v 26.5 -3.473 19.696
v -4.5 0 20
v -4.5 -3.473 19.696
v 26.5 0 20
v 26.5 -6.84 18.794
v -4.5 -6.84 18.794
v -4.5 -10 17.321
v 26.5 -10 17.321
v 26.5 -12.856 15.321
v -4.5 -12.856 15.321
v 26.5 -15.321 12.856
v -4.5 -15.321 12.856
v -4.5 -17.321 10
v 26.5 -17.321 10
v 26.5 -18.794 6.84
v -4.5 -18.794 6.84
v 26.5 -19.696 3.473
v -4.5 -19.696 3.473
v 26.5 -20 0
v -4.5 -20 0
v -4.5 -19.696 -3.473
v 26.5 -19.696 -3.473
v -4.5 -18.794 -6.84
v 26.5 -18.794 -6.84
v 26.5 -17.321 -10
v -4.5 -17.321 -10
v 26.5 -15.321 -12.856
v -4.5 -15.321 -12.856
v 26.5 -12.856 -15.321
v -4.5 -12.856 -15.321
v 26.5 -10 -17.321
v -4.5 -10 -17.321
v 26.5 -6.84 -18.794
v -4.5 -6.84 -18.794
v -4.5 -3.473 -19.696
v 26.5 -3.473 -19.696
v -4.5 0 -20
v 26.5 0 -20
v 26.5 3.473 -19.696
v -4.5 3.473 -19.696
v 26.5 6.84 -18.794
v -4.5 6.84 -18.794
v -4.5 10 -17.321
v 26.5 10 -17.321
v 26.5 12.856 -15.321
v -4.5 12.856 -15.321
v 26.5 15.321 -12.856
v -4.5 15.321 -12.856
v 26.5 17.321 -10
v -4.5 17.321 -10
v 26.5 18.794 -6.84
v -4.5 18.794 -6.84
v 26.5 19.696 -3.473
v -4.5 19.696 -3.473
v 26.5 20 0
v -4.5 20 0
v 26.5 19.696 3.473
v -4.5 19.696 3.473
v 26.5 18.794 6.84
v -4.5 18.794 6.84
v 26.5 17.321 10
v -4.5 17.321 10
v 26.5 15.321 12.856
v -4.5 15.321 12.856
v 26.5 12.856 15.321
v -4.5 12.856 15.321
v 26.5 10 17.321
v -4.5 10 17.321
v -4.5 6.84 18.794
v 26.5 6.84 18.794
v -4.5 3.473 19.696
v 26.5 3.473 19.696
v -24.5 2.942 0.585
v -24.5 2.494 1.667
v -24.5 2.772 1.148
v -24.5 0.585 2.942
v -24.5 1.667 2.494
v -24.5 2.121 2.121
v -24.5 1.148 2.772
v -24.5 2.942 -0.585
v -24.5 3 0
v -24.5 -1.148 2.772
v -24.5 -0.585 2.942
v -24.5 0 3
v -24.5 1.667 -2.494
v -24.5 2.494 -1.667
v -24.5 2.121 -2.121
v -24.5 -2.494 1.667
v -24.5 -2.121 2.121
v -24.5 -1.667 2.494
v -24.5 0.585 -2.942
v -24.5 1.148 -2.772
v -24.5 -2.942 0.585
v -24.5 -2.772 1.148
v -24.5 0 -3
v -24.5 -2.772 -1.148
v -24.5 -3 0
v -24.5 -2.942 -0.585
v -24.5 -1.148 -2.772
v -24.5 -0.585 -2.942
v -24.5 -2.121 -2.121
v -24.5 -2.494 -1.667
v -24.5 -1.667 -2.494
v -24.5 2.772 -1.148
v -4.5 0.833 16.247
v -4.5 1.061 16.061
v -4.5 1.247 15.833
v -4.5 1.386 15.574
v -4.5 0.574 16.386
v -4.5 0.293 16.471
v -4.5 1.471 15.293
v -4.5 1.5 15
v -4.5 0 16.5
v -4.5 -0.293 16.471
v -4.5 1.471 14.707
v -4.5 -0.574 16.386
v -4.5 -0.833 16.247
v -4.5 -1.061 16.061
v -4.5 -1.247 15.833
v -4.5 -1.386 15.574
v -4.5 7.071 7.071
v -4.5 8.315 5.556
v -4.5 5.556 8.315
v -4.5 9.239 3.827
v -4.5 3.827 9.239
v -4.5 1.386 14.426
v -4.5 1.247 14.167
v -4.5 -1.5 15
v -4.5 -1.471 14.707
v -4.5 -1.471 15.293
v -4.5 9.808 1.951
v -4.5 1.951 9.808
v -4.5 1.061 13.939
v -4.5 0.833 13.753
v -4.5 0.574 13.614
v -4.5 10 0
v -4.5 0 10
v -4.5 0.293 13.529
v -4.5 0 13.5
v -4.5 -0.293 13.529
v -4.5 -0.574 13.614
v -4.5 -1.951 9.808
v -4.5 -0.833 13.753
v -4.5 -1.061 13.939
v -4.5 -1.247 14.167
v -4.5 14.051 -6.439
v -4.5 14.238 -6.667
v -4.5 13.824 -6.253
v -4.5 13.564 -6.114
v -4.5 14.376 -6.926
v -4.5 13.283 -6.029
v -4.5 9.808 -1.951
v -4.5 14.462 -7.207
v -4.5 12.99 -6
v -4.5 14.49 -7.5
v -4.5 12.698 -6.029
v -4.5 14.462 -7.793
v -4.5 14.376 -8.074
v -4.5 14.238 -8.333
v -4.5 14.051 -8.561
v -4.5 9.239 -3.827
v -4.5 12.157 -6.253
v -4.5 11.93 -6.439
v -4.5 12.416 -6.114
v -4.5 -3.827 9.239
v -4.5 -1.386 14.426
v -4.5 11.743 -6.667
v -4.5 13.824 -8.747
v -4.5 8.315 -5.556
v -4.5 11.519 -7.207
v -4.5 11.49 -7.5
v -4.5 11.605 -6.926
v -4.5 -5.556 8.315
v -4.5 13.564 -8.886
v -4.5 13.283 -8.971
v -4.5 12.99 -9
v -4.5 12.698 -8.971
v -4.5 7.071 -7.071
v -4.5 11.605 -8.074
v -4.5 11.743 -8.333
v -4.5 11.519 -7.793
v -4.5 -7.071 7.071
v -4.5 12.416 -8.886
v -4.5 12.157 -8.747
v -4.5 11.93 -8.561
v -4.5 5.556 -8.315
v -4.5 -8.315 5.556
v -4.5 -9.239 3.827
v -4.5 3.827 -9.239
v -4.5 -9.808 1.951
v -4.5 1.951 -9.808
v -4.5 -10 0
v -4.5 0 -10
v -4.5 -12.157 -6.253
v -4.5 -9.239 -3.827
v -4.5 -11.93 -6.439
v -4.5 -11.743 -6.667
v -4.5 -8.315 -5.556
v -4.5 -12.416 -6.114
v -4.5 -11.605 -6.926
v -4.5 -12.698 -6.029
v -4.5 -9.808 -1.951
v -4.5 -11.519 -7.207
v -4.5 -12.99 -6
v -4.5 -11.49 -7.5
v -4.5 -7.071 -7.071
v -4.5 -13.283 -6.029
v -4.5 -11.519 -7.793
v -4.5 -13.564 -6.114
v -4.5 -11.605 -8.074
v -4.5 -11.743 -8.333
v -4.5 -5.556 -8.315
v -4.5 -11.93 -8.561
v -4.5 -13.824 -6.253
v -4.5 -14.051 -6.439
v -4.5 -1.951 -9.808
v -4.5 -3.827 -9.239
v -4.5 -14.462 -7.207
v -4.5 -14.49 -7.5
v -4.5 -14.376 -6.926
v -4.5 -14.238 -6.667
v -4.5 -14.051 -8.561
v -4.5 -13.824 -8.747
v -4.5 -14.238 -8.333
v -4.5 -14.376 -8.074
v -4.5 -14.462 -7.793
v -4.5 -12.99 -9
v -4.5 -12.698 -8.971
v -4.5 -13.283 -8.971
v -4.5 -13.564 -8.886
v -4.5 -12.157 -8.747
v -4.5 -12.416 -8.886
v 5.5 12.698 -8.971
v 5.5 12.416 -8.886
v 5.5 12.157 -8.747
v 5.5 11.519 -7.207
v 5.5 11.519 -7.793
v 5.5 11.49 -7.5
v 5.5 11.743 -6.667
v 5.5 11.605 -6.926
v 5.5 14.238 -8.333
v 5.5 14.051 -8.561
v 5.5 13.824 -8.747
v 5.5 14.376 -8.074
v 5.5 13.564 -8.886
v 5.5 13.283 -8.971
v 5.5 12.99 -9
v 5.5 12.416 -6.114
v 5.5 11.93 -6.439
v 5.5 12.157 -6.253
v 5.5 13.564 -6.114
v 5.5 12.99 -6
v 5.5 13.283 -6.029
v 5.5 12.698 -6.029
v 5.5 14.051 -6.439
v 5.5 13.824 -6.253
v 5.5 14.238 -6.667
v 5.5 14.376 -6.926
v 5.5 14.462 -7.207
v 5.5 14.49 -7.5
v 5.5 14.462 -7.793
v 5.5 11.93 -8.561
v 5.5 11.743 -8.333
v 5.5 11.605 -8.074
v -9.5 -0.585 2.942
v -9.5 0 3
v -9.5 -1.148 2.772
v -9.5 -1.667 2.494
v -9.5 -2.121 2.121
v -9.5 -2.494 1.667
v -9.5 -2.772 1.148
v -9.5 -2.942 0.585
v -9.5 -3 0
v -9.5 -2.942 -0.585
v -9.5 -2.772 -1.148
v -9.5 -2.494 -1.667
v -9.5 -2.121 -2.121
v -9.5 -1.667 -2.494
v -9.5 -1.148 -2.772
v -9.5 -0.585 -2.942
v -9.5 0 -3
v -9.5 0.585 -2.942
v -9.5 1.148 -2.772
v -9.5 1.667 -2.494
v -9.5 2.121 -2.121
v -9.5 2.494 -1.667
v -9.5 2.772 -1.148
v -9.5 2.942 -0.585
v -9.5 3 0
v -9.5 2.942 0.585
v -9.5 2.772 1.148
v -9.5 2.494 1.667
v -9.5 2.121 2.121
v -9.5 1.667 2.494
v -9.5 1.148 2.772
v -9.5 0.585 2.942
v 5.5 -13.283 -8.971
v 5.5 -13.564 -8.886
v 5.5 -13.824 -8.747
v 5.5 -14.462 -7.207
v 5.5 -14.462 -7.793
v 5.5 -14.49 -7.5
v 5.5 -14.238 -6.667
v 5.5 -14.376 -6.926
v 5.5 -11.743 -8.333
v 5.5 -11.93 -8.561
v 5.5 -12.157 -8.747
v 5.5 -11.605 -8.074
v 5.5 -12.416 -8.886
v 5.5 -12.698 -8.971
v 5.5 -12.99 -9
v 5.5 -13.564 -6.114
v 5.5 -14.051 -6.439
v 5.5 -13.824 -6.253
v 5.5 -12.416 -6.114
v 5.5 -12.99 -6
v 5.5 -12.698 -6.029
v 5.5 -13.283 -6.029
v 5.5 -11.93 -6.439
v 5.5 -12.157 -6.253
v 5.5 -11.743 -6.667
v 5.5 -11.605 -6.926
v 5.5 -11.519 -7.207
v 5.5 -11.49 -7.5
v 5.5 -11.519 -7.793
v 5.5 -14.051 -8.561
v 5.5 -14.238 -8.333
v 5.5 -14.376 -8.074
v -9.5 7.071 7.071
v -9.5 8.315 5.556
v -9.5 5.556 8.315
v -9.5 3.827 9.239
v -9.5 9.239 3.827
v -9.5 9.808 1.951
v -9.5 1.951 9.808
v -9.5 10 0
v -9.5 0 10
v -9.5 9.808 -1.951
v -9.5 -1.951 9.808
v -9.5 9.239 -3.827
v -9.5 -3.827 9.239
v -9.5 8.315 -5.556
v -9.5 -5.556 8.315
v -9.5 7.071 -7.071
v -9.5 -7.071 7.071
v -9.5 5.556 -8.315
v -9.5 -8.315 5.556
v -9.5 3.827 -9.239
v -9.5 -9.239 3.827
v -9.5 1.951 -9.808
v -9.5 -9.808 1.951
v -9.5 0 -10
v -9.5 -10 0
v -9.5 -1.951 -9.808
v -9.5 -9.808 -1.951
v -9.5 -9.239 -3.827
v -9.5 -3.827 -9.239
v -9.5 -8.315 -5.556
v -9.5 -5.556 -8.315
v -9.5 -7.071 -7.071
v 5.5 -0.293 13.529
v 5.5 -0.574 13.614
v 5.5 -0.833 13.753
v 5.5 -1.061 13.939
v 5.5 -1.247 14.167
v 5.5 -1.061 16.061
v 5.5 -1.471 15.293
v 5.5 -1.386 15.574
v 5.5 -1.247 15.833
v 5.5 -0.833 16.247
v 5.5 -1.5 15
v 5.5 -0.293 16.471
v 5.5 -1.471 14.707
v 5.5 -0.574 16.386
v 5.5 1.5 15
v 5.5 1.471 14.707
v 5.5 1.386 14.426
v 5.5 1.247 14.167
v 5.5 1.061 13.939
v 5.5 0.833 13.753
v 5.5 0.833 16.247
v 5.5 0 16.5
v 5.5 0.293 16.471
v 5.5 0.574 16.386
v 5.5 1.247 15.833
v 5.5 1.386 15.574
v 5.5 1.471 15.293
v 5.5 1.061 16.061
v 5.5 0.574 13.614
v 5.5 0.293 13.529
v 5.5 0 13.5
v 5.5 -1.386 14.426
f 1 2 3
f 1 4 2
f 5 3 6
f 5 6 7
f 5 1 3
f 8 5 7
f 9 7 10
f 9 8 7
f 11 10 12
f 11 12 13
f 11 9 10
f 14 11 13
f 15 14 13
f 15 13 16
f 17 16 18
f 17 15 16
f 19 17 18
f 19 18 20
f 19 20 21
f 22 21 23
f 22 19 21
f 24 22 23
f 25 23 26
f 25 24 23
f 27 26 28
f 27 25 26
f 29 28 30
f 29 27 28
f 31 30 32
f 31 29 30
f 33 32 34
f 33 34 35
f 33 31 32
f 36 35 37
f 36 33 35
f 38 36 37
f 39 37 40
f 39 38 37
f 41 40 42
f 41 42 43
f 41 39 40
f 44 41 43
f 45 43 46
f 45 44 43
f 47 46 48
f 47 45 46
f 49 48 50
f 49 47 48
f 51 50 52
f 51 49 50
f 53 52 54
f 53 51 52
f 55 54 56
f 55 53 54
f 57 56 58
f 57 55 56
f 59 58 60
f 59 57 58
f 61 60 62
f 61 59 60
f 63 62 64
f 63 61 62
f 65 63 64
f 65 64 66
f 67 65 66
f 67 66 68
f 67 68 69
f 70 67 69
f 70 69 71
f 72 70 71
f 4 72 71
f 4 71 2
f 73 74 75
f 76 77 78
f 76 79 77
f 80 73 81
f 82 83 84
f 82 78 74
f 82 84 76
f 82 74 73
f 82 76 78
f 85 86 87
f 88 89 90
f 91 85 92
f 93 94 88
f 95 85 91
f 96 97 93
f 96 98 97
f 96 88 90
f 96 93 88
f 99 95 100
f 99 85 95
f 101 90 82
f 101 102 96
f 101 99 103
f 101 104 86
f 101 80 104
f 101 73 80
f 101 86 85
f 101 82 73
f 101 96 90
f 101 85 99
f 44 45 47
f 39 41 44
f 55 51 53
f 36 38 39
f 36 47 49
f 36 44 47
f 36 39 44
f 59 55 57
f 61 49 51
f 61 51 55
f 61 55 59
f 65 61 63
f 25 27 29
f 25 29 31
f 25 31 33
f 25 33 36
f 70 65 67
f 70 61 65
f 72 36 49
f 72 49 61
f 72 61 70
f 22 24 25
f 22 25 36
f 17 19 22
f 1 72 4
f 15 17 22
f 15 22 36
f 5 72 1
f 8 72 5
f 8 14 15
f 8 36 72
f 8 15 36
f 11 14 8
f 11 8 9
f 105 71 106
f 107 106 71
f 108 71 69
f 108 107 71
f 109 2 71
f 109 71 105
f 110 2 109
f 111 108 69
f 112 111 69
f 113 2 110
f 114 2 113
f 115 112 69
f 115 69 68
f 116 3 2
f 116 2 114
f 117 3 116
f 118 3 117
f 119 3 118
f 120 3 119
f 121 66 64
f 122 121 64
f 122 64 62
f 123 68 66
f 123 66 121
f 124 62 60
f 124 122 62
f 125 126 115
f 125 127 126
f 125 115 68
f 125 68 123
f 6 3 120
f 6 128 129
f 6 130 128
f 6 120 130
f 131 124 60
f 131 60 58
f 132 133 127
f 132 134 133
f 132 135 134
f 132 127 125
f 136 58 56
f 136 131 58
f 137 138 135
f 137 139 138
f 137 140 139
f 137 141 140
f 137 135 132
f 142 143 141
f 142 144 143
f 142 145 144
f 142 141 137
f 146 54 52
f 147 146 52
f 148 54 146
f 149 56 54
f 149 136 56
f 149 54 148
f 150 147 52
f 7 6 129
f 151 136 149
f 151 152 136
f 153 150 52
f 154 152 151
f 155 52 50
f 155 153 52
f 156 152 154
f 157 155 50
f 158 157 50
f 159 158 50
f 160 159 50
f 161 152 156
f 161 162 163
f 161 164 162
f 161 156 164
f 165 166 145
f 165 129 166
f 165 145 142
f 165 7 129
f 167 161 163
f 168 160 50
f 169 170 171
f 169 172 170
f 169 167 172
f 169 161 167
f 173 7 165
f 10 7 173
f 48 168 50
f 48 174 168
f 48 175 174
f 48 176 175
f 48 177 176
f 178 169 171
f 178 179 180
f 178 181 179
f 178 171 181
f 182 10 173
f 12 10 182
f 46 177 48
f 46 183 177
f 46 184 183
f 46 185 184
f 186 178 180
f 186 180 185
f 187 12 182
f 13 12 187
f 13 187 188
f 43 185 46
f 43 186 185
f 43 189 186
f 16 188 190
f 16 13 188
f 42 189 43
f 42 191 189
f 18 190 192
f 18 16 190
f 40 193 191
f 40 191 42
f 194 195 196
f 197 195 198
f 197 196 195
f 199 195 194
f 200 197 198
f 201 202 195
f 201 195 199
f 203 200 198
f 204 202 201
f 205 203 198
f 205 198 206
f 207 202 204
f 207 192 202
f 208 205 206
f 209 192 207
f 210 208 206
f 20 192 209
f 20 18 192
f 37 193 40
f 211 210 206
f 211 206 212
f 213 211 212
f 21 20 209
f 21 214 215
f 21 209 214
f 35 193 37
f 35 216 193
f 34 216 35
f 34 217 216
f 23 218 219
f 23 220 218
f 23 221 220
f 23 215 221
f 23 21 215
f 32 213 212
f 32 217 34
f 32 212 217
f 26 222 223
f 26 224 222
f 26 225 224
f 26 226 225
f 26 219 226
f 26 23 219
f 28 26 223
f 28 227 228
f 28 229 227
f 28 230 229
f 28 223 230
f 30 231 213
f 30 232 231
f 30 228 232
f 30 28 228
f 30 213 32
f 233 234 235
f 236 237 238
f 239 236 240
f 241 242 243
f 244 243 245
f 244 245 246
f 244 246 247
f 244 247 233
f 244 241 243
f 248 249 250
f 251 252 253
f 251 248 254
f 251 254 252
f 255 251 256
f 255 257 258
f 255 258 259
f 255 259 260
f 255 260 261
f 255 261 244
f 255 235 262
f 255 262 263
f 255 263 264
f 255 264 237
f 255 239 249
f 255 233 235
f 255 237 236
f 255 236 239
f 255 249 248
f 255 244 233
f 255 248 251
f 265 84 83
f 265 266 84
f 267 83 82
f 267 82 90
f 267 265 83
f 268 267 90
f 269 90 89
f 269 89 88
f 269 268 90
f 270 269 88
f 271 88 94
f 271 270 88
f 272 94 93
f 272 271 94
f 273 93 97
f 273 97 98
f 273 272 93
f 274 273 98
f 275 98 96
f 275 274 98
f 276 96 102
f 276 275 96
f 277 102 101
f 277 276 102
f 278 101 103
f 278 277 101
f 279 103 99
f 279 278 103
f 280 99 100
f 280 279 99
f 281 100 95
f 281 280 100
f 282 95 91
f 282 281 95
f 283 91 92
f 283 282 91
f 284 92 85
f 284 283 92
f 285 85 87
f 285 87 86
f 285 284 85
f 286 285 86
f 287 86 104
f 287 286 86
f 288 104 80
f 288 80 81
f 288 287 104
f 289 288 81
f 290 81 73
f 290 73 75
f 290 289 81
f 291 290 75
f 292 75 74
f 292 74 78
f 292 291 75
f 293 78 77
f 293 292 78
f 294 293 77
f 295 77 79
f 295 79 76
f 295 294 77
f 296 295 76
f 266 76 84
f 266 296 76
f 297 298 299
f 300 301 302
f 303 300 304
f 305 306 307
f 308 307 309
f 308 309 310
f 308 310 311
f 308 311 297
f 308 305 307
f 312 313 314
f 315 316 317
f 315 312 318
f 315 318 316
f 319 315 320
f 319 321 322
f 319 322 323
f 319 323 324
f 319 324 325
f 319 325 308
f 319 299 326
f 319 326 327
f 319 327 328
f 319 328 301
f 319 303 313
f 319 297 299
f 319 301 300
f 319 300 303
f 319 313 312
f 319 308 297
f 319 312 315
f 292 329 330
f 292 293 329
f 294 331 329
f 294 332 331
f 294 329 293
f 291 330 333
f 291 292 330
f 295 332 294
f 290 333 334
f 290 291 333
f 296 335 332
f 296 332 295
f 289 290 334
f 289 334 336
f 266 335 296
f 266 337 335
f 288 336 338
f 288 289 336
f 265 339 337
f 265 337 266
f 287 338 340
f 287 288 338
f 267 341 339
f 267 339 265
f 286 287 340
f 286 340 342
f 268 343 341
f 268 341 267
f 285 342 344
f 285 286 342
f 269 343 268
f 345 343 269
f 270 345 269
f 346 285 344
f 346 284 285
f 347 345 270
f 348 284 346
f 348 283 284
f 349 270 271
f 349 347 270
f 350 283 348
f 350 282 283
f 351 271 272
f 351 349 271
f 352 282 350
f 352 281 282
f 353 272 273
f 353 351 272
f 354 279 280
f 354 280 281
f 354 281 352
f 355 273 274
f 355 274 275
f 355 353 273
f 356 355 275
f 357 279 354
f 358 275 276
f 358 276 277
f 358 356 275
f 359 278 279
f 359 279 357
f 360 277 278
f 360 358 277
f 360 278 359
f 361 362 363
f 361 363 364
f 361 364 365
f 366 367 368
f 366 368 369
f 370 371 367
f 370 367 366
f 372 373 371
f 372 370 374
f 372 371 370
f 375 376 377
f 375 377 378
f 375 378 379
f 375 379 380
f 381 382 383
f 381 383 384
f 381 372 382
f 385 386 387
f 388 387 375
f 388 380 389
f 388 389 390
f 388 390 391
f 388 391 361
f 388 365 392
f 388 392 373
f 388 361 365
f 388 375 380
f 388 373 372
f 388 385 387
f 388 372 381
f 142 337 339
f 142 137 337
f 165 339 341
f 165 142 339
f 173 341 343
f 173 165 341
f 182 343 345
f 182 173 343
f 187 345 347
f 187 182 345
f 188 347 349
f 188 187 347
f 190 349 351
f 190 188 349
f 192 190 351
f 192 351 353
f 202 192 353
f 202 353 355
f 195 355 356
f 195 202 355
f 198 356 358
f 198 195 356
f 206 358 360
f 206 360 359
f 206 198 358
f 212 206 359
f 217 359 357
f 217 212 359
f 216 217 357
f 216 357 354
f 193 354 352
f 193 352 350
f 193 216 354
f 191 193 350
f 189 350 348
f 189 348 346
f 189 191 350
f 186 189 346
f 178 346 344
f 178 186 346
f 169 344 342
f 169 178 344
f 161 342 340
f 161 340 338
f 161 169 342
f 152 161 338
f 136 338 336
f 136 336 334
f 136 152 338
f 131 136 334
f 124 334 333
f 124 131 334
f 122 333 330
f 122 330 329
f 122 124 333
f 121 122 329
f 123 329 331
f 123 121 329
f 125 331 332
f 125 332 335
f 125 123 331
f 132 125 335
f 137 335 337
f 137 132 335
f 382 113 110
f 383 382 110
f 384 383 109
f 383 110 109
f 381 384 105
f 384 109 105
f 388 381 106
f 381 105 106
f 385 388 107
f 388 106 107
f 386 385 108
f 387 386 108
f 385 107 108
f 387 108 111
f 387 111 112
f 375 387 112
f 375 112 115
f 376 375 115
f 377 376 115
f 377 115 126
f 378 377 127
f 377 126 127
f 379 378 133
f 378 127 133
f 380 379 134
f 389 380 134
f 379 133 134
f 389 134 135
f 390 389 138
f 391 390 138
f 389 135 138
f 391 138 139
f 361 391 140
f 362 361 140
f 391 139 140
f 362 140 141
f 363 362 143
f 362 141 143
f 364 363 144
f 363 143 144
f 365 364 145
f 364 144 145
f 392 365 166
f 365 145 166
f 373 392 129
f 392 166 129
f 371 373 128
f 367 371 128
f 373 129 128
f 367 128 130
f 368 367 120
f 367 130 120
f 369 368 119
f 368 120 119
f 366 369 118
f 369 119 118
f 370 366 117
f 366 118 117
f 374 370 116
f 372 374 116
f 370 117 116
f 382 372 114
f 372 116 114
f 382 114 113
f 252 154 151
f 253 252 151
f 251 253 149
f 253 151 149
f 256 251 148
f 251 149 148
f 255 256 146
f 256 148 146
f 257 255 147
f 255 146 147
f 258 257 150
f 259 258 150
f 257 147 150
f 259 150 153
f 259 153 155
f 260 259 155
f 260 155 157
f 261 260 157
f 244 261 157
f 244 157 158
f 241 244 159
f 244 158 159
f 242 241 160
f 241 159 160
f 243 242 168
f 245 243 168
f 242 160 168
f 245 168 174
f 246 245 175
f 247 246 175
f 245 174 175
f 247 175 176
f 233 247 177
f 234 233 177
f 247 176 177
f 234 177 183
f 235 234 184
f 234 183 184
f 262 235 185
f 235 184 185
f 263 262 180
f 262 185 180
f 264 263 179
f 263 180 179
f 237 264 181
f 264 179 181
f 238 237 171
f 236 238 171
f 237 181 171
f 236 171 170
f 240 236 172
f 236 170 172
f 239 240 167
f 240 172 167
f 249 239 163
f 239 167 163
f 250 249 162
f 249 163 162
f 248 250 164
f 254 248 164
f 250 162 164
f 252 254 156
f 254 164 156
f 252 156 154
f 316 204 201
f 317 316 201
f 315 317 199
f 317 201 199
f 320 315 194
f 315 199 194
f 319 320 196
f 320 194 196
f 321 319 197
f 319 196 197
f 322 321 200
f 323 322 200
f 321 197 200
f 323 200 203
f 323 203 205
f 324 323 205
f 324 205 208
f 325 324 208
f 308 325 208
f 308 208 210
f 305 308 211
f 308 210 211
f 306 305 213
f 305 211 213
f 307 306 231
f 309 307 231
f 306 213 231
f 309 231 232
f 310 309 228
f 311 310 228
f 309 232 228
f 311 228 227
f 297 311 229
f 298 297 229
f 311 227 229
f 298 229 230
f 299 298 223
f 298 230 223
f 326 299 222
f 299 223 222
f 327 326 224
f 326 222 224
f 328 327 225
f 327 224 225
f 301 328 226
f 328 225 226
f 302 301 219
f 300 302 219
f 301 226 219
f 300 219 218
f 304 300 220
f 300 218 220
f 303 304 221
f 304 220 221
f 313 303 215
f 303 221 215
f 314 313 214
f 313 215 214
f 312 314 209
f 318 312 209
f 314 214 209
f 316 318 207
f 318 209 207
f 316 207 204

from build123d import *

# Parameters (mm, degrees)
SKETCH2_R          = 1.5
CUT_EXTRUDE1_DEPTH = 10


with BuildPart() as part:
    # Sketch1 → Revolve1 (revolve)
    with BuildSketch(Plane.XY, mode=Mode.PRIVATE) as revolve1_sk:
        Polygon((-24.5, 0), (-24.5, 3), (-9.5, 3), (-9.5, 10), (-4.5, 10), (-4.5, 20), (26.5, 20), (26.5, 0), align=None)
    revolve(revolve1_sk.sketch.rotate(Axis((-28.153846154, 0, 0), (1, 0, 0)), 90), axis=Axis((-28.153846154, 0, 0), (1, 0, 0)))

    # Sketch2 → Cut-Extrude1 (cut)
    with BuildSketch(Plane.ZY.offset(4.5)):
        with Locations((15, 0)):
            Circle(SKETCH2_R)
        with Locations((-7.5, -12.990381057)):
            Circle(SKETCH2_R)
        with Locations((-7.5, 12.990381057)):
            Circle(SKETCH2_R)
    extrude(amount=-CUT_EXTRUDE1_DEPTH, mode=Mode.SUBTRACT)


solid = part.part
